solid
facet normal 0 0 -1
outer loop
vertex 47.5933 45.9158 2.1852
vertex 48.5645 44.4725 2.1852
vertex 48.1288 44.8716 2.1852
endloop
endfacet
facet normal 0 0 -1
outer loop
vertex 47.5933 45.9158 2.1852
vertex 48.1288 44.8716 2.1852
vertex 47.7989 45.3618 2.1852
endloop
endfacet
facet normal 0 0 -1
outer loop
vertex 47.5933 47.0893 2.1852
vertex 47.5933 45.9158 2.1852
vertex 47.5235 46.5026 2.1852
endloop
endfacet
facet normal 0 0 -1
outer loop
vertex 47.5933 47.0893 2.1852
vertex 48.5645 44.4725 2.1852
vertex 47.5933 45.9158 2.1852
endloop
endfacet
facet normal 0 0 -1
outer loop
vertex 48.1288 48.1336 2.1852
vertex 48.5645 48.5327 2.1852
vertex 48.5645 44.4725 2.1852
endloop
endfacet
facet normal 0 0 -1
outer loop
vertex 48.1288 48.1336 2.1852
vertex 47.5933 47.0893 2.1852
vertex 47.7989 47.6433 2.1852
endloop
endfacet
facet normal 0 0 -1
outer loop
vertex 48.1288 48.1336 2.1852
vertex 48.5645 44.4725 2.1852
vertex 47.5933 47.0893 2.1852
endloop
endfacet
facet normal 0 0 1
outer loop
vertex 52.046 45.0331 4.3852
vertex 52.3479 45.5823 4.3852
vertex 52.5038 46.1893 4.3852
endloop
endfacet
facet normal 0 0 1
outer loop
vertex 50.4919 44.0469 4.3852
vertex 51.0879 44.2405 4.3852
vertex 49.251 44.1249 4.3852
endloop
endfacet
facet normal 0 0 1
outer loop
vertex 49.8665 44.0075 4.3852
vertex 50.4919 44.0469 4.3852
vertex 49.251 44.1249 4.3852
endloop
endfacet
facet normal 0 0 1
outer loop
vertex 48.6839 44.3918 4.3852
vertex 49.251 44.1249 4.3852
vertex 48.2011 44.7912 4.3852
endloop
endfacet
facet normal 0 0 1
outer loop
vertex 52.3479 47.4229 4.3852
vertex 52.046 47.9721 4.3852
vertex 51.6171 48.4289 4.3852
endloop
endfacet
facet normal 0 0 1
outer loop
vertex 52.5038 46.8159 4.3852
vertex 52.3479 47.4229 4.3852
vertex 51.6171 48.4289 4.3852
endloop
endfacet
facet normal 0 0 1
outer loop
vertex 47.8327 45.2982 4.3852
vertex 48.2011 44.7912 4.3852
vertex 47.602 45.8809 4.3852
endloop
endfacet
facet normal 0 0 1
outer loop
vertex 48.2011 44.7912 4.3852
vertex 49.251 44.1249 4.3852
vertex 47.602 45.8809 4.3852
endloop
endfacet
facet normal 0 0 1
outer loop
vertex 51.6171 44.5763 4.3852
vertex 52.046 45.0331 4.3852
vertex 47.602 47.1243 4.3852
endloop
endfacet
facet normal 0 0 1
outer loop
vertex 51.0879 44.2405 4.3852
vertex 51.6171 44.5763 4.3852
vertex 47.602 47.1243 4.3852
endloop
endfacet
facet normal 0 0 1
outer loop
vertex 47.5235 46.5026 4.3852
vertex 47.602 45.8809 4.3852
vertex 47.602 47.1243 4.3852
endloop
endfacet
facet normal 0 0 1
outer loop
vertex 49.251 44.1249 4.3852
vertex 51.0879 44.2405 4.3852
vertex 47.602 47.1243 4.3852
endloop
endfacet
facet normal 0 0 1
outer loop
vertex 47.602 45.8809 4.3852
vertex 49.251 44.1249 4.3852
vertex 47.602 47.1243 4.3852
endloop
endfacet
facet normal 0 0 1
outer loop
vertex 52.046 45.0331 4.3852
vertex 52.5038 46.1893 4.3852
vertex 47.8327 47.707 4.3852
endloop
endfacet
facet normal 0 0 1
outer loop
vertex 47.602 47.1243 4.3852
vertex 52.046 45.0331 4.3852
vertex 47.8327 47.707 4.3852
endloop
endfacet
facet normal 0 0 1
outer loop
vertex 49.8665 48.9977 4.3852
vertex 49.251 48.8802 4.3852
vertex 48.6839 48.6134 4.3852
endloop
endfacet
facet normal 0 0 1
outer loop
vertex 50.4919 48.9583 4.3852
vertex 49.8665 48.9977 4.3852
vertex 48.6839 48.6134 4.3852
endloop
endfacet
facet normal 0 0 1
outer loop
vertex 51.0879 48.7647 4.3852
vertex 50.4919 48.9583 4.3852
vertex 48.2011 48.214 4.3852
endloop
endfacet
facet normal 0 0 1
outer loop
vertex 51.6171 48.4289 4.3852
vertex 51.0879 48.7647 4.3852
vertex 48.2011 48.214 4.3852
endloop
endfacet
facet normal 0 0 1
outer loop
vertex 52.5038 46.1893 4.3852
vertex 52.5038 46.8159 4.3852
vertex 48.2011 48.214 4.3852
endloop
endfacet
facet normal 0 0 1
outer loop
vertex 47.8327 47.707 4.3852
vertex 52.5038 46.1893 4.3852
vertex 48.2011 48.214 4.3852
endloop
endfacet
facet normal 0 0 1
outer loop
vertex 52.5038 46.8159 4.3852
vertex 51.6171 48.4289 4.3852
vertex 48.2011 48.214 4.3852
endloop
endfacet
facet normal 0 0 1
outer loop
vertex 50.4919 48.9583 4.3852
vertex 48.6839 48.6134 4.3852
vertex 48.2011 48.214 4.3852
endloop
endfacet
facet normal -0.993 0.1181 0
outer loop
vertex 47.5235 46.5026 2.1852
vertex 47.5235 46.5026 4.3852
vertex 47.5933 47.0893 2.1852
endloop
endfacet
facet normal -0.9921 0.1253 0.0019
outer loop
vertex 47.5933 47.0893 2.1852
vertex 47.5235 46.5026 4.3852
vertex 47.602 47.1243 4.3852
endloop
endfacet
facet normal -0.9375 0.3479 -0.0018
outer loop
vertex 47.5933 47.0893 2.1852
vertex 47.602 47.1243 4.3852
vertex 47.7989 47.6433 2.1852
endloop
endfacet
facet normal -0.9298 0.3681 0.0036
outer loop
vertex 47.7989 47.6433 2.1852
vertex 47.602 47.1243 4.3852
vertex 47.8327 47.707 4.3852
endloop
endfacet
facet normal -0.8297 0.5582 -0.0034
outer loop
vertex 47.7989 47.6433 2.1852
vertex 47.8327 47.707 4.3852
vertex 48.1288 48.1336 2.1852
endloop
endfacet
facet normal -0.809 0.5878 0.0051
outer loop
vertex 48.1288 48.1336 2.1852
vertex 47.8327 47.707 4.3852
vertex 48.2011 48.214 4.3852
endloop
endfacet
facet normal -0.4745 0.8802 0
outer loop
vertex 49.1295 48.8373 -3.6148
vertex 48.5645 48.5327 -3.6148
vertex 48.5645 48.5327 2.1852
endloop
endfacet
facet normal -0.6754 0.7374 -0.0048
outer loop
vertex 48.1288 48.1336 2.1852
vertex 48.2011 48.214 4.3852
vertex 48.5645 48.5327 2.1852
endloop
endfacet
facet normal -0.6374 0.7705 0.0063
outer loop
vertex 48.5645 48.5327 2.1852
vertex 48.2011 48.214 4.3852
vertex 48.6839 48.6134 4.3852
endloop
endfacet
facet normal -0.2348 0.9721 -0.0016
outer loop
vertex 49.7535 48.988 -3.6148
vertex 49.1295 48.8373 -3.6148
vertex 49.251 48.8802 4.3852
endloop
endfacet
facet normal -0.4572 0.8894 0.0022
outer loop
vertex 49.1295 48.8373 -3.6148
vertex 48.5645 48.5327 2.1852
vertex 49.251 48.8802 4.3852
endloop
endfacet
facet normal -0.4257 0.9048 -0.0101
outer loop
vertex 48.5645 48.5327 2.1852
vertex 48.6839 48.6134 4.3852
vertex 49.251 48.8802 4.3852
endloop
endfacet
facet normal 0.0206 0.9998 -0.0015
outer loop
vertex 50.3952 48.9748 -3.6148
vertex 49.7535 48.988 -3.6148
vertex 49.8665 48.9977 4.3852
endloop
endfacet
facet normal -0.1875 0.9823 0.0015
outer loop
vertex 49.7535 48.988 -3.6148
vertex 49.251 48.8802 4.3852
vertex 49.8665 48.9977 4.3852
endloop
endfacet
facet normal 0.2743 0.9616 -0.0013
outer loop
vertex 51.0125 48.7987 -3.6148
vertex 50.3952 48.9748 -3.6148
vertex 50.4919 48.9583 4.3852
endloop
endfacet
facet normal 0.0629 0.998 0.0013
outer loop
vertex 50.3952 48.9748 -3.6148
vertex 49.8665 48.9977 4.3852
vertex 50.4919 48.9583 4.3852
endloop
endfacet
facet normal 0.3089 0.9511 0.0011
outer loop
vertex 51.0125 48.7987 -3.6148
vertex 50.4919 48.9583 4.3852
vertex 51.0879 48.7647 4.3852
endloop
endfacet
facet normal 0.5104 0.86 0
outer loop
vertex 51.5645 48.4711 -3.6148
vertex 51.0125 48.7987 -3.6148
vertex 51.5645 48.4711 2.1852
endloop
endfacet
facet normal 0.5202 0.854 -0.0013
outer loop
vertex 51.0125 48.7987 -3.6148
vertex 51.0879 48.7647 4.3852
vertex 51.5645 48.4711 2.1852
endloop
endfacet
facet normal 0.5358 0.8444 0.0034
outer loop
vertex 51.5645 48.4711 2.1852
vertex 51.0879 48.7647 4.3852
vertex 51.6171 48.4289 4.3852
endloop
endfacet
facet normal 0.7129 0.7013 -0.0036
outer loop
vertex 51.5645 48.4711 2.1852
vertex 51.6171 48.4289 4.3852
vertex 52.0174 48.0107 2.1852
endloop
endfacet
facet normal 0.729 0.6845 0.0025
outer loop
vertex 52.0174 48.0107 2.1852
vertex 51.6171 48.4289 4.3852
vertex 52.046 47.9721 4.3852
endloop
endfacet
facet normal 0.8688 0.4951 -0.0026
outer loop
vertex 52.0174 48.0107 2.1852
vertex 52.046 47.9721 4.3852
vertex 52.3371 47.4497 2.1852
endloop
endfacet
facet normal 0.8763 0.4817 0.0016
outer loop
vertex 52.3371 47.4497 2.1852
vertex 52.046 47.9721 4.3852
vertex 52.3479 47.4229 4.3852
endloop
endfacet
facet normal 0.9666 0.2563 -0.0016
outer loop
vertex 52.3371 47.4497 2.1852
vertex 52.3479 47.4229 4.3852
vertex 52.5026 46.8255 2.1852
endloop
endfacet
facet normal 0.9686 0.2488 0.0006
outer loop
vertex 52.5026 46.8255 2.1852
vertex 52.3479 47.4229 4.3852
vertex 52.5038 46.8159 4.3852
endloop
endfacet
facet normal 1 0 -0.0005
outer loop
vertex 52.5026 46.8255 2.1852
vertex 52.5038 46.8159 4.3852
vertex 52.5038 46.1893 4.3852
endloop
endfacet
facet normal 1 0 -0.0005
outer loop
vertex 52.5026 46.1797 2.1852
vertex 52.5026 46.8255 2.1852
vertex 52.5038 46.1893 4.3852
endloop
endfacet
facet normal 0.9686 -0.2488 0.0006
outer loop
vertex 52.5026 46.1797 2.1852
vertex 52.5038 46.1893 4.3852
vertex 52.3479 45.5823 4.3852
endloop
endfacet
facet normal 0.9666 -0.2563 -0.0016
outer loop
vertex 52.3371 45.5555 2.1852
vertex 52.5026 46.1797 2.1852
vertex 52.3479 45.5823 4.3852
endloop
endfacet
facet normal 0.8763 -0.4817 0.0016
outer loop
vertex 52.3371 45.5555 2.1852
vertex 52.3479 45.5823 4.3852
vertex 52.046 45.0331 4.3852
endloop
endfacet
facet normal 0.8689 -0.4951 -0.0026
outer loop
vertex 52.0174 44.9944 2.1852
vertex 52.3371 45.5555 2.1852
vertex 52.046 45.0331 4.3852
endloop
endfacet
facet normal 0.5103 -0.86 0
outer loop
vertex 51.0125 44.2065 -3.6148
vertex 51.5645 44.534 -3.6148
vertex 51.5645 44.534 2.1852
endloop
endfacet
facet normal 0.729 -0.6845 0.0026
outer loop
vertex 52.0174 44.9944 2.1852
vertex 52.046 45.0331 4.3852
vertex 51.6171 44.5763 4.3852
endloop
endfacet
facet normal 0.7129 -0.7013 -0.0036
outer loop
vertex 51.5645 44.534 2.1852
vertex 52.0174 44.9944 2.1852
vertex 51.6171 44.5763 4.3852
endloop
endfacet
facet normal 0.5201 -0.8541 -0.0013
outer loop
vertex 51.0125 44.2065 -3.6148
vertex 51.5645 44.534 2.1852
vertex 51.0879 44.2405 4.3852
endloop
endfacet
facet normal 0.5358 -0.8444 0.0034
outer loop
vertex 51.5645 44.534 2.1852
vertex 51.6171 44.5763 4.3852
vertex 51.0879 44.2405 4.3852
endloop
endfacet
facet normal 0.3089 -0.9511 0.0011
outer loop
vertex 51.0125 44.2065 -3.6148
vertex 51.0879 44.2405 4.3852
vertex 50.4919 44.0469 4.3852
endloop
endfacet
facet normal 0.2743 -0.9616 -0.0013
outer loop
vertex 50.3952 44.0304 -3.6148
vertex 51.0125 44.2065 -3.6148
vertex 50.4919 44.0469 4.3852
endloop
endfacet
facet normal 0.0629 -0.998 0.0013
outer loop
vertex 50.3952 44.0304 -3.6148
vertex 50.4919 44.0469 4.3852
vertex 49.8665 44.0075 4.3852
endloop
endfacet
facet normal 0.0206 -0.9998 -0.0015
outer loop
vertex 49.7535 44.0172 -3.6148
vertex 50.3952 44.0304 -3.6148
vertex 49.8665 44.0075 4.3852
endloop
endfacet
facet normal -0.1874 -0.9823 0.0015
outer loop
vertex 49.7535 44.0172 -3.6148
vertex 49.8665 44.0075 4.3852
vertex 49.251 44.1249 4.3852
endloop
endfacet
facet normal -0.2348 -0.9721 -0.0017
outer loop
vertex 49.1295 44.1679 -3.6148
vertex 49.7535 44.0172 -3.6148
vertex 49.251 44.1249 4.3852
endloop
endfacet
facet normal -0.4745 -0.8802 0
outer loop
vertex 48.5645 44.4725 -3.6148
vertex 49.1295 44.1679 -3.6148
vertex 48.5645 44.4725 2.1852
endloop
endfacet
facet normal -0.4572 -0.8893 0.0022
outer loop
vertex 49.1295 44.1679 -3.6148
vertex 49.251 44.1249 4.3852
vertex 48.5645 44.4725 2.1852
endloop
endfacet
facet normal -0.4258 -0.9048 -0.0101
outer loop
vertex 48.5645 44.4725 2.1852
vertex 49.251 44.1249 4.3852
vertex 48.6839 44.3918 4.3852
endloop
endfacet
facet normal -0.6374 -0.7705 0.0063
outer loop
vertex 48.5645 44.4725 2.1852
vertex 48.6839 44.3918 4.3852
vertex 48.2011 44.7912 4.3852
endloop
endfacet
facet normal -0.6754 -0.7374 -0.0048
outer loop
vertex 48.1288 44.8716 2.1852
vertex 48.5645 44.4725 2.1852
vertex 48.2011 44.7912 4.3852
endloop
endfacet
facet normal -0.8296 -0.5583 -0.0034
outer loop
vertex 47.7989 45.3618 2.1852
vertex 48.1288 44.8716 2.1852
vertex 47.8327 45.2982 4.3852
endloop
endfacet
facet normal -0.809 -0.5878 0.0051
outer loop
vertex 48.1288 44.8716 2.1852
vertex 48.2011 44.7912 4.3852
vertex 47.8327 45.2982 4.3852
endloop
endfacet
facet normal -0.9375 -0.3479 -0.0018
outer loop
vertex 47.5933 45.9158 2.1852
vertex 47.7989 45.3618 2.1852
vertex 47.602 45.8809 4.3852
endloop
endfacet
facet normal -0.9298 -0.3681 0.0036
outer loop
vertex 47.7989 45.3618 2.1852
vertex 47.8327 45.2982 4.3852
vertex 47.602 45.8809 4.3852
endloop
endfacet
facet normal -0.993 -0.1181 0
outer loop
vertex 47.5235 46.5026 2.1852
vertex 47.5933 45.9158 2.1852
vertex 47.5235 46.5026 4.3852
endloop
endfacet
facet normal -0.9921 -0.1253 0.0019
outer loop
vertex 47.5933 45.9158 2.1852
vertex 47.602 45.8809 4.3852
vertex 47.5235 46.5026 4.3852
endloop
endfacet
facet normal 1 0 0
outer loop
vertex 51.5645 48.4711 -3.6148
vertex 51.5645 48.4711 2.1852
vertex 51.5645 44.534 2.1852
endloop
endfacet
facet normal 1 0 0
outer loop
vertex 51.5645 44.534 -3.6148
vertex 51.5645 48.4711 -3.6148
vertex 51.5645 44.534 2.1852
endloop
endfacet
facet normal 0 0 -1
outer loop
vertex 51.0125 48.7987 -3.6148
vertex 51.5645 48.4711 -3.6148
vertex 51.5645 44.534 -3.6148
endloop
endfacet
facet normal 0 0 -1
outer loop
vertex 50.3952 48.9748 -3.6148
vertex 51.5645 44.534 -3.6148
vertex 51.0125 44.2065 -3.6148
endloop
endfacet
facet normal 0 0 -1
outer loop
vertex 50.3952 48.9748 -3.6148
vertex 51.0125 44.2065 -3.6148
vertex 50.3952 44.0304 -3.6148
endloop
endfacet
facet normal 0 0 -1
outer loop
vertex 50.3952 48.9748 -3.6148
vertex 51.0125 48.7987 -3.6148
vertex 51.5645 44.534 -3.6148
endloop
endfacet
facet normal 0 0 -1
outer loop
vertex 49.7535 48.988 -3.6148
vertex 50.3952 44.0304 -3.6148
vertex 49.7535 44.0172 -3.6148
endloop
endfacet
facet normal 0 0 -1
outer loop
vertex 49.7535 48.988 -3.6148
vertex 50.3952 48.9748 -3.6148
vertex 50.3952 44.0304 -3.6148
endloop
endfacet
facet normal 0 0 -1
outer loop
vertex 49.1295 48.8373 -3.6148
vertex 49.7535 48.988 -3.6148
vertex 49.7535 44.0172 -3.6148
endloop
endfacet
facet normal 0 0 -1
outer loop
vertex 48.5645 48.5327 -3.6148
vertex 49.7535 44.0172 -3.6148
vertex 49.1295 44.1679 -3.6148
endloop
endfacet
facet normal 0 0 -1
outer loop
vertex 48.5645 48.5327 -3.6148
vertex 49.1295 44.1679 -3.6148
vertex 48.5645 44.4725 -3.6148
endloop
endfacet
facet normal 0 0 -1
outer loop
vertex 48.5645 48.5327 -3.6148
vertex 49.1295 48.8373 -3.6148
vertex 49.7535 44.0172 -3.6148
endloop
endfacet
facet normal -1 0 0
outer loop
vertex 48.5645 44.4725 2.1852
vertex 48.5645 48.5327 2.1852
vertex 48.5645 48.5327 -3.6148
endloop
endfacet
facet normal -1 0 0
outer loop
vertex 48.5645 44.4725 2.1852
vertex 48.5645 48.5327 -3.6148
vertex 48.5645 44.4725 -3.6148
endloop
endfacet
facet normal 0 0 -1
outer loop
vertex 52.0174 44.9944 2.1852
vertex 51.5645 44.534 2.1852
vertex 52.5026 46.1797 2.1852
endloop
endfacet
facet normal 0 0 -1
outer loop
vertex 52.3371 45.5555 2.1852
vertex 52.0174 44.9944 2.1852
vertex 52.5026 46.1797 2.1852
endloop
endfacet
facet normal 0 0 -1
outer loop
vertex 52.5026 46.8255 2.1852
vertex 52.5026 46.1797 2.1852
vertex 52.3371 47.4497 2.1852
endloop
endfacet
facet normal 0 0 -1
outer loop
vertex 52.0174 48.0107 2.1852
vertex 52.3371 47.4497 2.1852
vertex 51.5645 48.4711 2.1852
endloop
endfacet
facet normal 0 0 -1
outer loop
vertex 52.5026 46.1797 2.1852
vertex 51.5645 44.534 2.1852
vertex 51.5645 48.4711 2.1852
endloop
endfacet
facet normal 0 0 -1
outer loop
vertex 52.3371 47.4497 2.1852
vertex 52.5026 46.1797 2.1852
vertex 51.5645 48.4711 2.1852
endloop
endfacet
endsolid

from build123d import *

# Parameters (mm, degrees)
SKETCH_2_R          = 2.5
EXTRUDE_1_DEPTH     = 8
CUT_EXTRUDE_START   = -5.8
CUT_EXTRUDE_1_DEPTH = 5.8


with BuildPart() as part:
    # 草图2 → 凸台-拉伸1 (new body)
    with BuildSketch(Plane(origin=(0, 0, 4.385209583), x_dir=(-1, 0, 0), z_dir=(0, 0, -1))):
        with Locations((-50.023496645, 46.50258845)):
            Circle(SKETCH_2_R)
    extrude(amount=EXTRUDE_1_DEPTH)

    # 草图3 → 切除-拉伸1 (cut)
    with BuildSketch(Plane(origin=(0, 0, -3.614790417), x_dir=(-1, 0, 0), z_dir=(0, 0, -1)).offset(CUT_EXTRUDE_START)):
        with BuildLine():
            Line((-51.564528211, 48.471146733), (-51.564528211, 44.534030167))
            ThreePointArc((-51.564528211, 44.534030167), (-52.523496645, 46.50258845), (-51.564528211, 48.471146733))
        make_face()
        with BuildLine():
            Line((-48.564528211, 48.532714335), (-48.564528211, 44.472462565))
            ThreePointArc((-48.564528211, 44.472462565), (-47.523496645, 46.50258845), (-48.564528211, 48.532714335))
        make_face()
    extrude(amount=CUT_EXTRUDE_1_DEPTH, mode=Mode.SUBTRACT)


solid = part.part
